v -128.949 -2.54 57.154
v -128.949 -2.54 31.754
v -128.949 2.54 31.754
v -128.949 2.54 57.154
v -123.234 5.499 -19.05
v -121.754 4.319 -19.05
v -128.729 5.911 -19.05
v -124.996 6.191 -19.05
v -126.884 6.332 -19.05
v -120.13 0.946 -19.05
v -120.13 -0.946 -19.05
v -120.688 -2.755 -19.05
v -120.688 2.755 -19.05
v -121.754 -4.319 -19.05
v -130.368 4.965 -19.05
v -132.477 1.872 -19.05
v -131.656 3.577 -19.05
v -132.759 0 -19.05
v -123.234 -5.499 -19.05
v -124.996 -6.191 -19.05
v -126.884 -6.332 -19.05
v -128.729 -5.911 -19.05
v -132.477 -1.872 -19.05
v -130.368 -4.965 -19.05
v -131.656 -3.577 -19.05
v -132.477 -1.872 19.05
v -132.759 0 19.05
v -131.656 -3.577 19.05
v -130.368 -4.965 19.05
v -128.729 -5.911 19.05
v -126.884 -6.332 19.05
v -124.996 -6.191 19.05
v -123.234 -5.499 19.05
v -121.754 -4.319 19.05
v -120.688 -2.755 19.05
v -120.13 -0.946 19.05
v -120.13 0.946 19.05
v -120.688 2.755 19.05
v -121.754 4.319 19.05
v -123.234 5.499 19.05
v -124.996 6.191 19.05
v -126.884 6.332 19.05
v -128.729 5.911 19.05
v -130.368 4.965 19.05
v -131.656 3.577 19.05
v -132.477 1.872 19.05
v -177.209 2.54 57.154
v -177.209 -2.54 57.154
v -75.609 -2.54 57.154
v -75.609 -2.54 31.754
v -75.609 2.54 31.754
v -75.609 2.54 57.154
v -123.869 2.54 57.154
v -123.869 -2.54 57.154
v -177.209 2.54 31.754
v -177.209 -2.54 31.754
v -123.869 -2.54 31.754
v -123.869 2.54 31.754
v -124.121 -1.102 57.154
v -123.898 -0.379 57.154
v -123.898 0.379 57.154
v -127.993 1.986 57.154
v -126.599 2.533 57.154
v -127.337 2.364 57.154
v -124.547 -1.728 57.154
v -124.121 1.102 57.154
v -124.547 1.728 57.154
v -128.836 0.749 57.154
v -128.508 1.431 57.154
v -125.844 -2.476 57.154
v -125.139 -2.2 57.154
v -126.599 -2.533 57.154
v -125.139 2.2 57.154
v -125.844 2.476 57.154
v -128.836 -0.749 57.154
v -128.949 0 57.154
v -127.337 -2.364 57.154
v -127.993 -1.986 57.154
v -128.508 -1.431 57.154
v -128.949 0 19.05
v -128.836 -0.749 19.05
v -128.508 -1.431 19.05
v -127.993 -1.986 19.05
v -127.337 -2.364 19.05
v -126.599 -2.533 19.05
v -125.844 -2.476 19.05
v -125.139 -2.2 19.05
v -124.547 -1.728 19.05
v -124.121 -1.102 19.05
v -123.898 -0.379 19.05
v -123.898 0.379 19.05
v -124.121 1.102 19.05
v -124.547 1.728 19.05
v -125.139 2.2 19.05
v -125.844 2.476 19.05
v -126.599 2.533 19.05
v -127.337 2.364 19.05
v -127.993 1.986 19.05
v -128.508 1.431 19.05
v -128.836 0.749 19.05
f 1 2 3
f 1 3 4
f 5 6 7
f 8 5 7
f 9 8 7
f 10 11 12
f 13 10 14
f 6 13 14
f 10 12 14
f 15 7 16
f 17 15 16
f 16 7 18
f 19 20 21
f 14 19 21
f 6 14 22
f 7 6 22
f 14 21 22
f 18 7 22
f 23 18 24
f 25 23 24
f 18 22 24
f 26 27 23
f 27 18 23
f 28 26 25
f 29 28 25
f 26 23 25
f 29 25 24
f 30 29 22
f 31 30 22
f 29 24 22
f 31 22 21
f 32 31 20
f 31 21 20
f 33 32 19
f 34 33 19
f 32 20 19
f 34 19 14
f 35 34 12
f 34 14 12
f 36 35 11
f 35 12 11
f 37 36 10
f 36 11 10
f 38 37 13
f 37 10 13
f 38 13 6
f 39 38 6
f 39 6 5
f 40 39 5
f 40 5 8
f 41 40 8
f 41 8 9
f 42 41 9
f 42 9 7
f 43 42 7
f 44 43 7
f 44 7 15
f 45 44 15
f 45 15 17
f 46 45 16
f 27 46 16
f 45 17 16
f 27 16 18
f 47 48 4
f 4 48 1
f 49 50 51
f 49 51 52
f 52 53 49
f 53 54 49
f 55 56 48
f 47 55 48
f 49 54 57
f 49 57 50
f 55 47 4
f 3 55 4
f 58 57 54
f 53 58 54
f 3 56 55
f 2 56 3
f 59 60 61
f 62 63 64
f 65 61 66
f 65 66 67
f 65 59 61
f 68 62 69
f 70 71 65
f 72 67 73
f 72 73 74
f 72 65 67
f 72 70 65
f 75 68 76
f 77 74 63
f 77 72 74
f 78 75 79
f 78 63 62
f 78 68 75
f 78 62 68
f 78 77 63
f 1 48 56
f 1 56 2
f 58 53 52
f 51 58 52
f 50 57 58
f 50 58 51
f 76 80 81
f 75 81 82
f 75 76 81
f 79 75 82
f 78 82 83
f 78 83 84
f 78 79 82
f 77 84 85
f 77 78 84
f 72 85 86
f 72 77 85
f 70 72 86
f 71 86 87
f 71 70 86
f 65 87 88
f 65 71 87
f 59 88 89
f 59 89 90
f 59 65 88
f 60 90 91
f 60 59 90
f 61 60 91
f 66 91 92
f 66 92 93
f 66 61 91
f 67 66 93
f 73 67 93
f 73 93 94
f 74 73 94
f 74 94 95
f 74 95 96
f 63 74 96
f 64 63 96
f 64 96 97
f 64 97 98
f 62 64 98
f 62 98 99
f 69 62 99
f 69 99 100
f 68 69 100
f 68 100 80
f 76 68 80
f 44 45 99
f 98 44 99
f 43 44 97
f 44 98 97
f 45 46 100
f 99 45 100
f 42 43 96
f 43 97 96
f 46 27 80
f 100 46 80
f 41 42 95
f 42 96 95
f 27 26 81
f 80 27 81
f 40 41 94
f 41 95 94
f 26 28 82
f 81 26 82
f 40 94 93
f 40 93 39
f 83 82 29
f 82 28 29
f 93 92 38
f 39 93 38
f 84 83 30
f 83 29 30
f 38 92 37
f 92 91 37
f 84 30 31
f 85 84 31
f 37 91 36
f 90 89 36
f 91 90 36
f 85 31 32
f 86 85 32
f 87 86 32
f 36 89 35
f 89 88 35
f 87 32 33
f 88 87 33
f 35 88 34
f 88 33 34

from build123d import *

# Parameters (mm, degrees)
F0_W     = 2.54
F0_H     = 12.7037496686
F0_H_2   = 25.4
F0_W_2   = 48.26
F4_DEPTH = 2.54


with BuildPart() as f1:
    # F0 (on Front) → F1 (revolve)
    with BuildSketch(Plane.XZ):
        Polygon((-126.4092789139, -19.05), (-126.4092789139, 0), (-126.4092789139, 12.7), (-126.4092789139, 19.05), (-128.9492789139, 19.05), (-132.7592789139, 19.05), (-132.7592789139, -19.05), align=None)
    revolve(axis=Axis((-126.4092789139, 0, 6.35), (0, 0, 1)))

    # F0 (on Front) → F2 (revolve)
    with BuildSketch(Plane.XZ):
        with Locations((-127.6792789139, 25.4018748343)):
            Rectangle(F0_W, F0_H)
    revolve(axis=Axis((-126.4092789139, 0, 38.1018748343), (0, 0, 1)))

    # F0 (on Front) → F3 (revolve)
    with BuildSketch(Plane.XZ):
        with Locations((-127.6792789139, 44.4537496686)):
            Rectangle(F0_W, F0_H_2)
    revolve(axis=Axis((-126.4092789139, 0, 38.1018748343), (0, 0, 1)))


with BuildPart() as f4:
    # F0 (on Front) → F4 (new body, symmetric)
    with BuildSketch(Plane.XZ):
        with Locations((-153.0792789139, 44.4537496686)):
            Rectangle(F0_W_2, F0_H_2)
    extrude(amount=F4_DEPTH, both=True)


with BuildPart() as f4b:
    # F0 (on Front) → F4, piece 2 (new body, symmetric)
    with BuildSketch(Plane.XZ):
        with Locations((-99.7392789139, 44.4537496686)):
            Rectangle(F0_W_2, F0_H_2)
    extrude(amount=F4_DEPTH, both=True)


solid = Compound([f1.part, f4.part, f4b.part])
